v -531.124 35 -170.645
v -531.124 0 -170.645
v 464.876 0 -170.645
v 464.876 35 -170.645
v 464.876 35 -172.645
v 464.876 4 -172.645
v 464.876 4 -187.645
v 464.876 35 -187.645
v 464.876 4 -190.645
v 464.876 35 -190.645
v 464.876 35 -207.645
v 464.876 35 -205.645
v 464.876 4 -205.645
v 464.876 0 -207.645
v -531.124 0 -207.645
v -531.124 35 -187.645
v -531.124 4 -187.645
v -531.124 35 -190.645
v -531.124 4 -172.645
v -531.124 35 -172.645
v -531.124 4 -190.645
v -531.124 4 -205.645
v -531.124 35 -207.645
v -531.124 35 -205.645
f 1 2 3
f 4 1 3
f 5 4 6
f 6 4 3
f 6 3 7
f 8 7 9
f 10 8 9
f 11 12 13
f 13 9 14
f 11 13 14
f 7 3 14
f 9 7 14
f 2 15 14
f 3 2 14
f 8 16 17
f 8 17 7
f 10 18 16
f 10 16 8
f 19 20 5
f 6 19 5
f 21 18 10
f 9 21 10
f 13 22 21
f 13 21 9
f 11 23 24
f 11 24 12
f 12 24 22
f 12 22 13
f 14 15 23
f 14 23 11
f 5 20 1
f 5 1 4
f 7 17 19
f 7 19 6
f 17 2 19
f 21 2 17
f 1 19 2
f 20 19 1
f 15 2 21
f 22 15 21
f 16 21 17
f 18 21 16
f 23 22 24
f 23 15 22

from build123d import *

# Parameters (mm, degrees)
SKETCH2_W           = 1000
SKETCH2_H           = 37
BOSS_EXTRUDE1_DEPTH = 35
SKETCH3_W           = 1000
SKETCH3_H           = 15
CUT_EXTRUDE1_DEPTH  = 31
SKETCH4_W           = 4
SKETCH4_H           = 35
CUT_EXTRUDE2_DEPTH  = 190


with BuildPart() as part:
    # Sketch2 → Boss-Extrude1 (new body)
    with BuildSketch(Plane(origin=(0, 0, 0), x_dir=(1, 0, 0), z_dir=(0, 1, 0))):
        with Locations((-35.123966942, 189.144628099)):
            Rectangle(SKETCH2_W, SKETCH2_H)
    extrude(amount=BOSS_EXTRUDE1_DEPTH)

    # Sketch3 → Cut-Extrude1 (cut)
    with BuildSketch(Plane(origin=(0, 35, 0), x_dir=(1, 0, 0), z_dir=(0, 1, 0))):
        with Locations((-35.123966942, 198.144628099)):
            Rectangle(SKETCH3_W, SKETCH3_H)
        with Locations((-35.123966942, 180.144628099)):
            Rectangle(SKETCH3_W, SKETCH3_H)
    extrude(amount=-CUT_EXTRUDE1_DEPTH, mode=Mode.SUBTRACT)

    # Sketch4 → Cut-Extrude2 (cut)
    with BuildSketch(Plane(origin=(0, 0, -207.644628099), x_dir=(-1, 0, 0), z_dir=(0, 0, -1))):
        with Locations((533.123966942, 17.5)):
            Rectangle(SKETCH4_W, SKETCH4_H)
    extrude(amount=-CUT_EXTRUDE2_DEPTH, mode=Mode.SUBTRACT)


solid = part.part
